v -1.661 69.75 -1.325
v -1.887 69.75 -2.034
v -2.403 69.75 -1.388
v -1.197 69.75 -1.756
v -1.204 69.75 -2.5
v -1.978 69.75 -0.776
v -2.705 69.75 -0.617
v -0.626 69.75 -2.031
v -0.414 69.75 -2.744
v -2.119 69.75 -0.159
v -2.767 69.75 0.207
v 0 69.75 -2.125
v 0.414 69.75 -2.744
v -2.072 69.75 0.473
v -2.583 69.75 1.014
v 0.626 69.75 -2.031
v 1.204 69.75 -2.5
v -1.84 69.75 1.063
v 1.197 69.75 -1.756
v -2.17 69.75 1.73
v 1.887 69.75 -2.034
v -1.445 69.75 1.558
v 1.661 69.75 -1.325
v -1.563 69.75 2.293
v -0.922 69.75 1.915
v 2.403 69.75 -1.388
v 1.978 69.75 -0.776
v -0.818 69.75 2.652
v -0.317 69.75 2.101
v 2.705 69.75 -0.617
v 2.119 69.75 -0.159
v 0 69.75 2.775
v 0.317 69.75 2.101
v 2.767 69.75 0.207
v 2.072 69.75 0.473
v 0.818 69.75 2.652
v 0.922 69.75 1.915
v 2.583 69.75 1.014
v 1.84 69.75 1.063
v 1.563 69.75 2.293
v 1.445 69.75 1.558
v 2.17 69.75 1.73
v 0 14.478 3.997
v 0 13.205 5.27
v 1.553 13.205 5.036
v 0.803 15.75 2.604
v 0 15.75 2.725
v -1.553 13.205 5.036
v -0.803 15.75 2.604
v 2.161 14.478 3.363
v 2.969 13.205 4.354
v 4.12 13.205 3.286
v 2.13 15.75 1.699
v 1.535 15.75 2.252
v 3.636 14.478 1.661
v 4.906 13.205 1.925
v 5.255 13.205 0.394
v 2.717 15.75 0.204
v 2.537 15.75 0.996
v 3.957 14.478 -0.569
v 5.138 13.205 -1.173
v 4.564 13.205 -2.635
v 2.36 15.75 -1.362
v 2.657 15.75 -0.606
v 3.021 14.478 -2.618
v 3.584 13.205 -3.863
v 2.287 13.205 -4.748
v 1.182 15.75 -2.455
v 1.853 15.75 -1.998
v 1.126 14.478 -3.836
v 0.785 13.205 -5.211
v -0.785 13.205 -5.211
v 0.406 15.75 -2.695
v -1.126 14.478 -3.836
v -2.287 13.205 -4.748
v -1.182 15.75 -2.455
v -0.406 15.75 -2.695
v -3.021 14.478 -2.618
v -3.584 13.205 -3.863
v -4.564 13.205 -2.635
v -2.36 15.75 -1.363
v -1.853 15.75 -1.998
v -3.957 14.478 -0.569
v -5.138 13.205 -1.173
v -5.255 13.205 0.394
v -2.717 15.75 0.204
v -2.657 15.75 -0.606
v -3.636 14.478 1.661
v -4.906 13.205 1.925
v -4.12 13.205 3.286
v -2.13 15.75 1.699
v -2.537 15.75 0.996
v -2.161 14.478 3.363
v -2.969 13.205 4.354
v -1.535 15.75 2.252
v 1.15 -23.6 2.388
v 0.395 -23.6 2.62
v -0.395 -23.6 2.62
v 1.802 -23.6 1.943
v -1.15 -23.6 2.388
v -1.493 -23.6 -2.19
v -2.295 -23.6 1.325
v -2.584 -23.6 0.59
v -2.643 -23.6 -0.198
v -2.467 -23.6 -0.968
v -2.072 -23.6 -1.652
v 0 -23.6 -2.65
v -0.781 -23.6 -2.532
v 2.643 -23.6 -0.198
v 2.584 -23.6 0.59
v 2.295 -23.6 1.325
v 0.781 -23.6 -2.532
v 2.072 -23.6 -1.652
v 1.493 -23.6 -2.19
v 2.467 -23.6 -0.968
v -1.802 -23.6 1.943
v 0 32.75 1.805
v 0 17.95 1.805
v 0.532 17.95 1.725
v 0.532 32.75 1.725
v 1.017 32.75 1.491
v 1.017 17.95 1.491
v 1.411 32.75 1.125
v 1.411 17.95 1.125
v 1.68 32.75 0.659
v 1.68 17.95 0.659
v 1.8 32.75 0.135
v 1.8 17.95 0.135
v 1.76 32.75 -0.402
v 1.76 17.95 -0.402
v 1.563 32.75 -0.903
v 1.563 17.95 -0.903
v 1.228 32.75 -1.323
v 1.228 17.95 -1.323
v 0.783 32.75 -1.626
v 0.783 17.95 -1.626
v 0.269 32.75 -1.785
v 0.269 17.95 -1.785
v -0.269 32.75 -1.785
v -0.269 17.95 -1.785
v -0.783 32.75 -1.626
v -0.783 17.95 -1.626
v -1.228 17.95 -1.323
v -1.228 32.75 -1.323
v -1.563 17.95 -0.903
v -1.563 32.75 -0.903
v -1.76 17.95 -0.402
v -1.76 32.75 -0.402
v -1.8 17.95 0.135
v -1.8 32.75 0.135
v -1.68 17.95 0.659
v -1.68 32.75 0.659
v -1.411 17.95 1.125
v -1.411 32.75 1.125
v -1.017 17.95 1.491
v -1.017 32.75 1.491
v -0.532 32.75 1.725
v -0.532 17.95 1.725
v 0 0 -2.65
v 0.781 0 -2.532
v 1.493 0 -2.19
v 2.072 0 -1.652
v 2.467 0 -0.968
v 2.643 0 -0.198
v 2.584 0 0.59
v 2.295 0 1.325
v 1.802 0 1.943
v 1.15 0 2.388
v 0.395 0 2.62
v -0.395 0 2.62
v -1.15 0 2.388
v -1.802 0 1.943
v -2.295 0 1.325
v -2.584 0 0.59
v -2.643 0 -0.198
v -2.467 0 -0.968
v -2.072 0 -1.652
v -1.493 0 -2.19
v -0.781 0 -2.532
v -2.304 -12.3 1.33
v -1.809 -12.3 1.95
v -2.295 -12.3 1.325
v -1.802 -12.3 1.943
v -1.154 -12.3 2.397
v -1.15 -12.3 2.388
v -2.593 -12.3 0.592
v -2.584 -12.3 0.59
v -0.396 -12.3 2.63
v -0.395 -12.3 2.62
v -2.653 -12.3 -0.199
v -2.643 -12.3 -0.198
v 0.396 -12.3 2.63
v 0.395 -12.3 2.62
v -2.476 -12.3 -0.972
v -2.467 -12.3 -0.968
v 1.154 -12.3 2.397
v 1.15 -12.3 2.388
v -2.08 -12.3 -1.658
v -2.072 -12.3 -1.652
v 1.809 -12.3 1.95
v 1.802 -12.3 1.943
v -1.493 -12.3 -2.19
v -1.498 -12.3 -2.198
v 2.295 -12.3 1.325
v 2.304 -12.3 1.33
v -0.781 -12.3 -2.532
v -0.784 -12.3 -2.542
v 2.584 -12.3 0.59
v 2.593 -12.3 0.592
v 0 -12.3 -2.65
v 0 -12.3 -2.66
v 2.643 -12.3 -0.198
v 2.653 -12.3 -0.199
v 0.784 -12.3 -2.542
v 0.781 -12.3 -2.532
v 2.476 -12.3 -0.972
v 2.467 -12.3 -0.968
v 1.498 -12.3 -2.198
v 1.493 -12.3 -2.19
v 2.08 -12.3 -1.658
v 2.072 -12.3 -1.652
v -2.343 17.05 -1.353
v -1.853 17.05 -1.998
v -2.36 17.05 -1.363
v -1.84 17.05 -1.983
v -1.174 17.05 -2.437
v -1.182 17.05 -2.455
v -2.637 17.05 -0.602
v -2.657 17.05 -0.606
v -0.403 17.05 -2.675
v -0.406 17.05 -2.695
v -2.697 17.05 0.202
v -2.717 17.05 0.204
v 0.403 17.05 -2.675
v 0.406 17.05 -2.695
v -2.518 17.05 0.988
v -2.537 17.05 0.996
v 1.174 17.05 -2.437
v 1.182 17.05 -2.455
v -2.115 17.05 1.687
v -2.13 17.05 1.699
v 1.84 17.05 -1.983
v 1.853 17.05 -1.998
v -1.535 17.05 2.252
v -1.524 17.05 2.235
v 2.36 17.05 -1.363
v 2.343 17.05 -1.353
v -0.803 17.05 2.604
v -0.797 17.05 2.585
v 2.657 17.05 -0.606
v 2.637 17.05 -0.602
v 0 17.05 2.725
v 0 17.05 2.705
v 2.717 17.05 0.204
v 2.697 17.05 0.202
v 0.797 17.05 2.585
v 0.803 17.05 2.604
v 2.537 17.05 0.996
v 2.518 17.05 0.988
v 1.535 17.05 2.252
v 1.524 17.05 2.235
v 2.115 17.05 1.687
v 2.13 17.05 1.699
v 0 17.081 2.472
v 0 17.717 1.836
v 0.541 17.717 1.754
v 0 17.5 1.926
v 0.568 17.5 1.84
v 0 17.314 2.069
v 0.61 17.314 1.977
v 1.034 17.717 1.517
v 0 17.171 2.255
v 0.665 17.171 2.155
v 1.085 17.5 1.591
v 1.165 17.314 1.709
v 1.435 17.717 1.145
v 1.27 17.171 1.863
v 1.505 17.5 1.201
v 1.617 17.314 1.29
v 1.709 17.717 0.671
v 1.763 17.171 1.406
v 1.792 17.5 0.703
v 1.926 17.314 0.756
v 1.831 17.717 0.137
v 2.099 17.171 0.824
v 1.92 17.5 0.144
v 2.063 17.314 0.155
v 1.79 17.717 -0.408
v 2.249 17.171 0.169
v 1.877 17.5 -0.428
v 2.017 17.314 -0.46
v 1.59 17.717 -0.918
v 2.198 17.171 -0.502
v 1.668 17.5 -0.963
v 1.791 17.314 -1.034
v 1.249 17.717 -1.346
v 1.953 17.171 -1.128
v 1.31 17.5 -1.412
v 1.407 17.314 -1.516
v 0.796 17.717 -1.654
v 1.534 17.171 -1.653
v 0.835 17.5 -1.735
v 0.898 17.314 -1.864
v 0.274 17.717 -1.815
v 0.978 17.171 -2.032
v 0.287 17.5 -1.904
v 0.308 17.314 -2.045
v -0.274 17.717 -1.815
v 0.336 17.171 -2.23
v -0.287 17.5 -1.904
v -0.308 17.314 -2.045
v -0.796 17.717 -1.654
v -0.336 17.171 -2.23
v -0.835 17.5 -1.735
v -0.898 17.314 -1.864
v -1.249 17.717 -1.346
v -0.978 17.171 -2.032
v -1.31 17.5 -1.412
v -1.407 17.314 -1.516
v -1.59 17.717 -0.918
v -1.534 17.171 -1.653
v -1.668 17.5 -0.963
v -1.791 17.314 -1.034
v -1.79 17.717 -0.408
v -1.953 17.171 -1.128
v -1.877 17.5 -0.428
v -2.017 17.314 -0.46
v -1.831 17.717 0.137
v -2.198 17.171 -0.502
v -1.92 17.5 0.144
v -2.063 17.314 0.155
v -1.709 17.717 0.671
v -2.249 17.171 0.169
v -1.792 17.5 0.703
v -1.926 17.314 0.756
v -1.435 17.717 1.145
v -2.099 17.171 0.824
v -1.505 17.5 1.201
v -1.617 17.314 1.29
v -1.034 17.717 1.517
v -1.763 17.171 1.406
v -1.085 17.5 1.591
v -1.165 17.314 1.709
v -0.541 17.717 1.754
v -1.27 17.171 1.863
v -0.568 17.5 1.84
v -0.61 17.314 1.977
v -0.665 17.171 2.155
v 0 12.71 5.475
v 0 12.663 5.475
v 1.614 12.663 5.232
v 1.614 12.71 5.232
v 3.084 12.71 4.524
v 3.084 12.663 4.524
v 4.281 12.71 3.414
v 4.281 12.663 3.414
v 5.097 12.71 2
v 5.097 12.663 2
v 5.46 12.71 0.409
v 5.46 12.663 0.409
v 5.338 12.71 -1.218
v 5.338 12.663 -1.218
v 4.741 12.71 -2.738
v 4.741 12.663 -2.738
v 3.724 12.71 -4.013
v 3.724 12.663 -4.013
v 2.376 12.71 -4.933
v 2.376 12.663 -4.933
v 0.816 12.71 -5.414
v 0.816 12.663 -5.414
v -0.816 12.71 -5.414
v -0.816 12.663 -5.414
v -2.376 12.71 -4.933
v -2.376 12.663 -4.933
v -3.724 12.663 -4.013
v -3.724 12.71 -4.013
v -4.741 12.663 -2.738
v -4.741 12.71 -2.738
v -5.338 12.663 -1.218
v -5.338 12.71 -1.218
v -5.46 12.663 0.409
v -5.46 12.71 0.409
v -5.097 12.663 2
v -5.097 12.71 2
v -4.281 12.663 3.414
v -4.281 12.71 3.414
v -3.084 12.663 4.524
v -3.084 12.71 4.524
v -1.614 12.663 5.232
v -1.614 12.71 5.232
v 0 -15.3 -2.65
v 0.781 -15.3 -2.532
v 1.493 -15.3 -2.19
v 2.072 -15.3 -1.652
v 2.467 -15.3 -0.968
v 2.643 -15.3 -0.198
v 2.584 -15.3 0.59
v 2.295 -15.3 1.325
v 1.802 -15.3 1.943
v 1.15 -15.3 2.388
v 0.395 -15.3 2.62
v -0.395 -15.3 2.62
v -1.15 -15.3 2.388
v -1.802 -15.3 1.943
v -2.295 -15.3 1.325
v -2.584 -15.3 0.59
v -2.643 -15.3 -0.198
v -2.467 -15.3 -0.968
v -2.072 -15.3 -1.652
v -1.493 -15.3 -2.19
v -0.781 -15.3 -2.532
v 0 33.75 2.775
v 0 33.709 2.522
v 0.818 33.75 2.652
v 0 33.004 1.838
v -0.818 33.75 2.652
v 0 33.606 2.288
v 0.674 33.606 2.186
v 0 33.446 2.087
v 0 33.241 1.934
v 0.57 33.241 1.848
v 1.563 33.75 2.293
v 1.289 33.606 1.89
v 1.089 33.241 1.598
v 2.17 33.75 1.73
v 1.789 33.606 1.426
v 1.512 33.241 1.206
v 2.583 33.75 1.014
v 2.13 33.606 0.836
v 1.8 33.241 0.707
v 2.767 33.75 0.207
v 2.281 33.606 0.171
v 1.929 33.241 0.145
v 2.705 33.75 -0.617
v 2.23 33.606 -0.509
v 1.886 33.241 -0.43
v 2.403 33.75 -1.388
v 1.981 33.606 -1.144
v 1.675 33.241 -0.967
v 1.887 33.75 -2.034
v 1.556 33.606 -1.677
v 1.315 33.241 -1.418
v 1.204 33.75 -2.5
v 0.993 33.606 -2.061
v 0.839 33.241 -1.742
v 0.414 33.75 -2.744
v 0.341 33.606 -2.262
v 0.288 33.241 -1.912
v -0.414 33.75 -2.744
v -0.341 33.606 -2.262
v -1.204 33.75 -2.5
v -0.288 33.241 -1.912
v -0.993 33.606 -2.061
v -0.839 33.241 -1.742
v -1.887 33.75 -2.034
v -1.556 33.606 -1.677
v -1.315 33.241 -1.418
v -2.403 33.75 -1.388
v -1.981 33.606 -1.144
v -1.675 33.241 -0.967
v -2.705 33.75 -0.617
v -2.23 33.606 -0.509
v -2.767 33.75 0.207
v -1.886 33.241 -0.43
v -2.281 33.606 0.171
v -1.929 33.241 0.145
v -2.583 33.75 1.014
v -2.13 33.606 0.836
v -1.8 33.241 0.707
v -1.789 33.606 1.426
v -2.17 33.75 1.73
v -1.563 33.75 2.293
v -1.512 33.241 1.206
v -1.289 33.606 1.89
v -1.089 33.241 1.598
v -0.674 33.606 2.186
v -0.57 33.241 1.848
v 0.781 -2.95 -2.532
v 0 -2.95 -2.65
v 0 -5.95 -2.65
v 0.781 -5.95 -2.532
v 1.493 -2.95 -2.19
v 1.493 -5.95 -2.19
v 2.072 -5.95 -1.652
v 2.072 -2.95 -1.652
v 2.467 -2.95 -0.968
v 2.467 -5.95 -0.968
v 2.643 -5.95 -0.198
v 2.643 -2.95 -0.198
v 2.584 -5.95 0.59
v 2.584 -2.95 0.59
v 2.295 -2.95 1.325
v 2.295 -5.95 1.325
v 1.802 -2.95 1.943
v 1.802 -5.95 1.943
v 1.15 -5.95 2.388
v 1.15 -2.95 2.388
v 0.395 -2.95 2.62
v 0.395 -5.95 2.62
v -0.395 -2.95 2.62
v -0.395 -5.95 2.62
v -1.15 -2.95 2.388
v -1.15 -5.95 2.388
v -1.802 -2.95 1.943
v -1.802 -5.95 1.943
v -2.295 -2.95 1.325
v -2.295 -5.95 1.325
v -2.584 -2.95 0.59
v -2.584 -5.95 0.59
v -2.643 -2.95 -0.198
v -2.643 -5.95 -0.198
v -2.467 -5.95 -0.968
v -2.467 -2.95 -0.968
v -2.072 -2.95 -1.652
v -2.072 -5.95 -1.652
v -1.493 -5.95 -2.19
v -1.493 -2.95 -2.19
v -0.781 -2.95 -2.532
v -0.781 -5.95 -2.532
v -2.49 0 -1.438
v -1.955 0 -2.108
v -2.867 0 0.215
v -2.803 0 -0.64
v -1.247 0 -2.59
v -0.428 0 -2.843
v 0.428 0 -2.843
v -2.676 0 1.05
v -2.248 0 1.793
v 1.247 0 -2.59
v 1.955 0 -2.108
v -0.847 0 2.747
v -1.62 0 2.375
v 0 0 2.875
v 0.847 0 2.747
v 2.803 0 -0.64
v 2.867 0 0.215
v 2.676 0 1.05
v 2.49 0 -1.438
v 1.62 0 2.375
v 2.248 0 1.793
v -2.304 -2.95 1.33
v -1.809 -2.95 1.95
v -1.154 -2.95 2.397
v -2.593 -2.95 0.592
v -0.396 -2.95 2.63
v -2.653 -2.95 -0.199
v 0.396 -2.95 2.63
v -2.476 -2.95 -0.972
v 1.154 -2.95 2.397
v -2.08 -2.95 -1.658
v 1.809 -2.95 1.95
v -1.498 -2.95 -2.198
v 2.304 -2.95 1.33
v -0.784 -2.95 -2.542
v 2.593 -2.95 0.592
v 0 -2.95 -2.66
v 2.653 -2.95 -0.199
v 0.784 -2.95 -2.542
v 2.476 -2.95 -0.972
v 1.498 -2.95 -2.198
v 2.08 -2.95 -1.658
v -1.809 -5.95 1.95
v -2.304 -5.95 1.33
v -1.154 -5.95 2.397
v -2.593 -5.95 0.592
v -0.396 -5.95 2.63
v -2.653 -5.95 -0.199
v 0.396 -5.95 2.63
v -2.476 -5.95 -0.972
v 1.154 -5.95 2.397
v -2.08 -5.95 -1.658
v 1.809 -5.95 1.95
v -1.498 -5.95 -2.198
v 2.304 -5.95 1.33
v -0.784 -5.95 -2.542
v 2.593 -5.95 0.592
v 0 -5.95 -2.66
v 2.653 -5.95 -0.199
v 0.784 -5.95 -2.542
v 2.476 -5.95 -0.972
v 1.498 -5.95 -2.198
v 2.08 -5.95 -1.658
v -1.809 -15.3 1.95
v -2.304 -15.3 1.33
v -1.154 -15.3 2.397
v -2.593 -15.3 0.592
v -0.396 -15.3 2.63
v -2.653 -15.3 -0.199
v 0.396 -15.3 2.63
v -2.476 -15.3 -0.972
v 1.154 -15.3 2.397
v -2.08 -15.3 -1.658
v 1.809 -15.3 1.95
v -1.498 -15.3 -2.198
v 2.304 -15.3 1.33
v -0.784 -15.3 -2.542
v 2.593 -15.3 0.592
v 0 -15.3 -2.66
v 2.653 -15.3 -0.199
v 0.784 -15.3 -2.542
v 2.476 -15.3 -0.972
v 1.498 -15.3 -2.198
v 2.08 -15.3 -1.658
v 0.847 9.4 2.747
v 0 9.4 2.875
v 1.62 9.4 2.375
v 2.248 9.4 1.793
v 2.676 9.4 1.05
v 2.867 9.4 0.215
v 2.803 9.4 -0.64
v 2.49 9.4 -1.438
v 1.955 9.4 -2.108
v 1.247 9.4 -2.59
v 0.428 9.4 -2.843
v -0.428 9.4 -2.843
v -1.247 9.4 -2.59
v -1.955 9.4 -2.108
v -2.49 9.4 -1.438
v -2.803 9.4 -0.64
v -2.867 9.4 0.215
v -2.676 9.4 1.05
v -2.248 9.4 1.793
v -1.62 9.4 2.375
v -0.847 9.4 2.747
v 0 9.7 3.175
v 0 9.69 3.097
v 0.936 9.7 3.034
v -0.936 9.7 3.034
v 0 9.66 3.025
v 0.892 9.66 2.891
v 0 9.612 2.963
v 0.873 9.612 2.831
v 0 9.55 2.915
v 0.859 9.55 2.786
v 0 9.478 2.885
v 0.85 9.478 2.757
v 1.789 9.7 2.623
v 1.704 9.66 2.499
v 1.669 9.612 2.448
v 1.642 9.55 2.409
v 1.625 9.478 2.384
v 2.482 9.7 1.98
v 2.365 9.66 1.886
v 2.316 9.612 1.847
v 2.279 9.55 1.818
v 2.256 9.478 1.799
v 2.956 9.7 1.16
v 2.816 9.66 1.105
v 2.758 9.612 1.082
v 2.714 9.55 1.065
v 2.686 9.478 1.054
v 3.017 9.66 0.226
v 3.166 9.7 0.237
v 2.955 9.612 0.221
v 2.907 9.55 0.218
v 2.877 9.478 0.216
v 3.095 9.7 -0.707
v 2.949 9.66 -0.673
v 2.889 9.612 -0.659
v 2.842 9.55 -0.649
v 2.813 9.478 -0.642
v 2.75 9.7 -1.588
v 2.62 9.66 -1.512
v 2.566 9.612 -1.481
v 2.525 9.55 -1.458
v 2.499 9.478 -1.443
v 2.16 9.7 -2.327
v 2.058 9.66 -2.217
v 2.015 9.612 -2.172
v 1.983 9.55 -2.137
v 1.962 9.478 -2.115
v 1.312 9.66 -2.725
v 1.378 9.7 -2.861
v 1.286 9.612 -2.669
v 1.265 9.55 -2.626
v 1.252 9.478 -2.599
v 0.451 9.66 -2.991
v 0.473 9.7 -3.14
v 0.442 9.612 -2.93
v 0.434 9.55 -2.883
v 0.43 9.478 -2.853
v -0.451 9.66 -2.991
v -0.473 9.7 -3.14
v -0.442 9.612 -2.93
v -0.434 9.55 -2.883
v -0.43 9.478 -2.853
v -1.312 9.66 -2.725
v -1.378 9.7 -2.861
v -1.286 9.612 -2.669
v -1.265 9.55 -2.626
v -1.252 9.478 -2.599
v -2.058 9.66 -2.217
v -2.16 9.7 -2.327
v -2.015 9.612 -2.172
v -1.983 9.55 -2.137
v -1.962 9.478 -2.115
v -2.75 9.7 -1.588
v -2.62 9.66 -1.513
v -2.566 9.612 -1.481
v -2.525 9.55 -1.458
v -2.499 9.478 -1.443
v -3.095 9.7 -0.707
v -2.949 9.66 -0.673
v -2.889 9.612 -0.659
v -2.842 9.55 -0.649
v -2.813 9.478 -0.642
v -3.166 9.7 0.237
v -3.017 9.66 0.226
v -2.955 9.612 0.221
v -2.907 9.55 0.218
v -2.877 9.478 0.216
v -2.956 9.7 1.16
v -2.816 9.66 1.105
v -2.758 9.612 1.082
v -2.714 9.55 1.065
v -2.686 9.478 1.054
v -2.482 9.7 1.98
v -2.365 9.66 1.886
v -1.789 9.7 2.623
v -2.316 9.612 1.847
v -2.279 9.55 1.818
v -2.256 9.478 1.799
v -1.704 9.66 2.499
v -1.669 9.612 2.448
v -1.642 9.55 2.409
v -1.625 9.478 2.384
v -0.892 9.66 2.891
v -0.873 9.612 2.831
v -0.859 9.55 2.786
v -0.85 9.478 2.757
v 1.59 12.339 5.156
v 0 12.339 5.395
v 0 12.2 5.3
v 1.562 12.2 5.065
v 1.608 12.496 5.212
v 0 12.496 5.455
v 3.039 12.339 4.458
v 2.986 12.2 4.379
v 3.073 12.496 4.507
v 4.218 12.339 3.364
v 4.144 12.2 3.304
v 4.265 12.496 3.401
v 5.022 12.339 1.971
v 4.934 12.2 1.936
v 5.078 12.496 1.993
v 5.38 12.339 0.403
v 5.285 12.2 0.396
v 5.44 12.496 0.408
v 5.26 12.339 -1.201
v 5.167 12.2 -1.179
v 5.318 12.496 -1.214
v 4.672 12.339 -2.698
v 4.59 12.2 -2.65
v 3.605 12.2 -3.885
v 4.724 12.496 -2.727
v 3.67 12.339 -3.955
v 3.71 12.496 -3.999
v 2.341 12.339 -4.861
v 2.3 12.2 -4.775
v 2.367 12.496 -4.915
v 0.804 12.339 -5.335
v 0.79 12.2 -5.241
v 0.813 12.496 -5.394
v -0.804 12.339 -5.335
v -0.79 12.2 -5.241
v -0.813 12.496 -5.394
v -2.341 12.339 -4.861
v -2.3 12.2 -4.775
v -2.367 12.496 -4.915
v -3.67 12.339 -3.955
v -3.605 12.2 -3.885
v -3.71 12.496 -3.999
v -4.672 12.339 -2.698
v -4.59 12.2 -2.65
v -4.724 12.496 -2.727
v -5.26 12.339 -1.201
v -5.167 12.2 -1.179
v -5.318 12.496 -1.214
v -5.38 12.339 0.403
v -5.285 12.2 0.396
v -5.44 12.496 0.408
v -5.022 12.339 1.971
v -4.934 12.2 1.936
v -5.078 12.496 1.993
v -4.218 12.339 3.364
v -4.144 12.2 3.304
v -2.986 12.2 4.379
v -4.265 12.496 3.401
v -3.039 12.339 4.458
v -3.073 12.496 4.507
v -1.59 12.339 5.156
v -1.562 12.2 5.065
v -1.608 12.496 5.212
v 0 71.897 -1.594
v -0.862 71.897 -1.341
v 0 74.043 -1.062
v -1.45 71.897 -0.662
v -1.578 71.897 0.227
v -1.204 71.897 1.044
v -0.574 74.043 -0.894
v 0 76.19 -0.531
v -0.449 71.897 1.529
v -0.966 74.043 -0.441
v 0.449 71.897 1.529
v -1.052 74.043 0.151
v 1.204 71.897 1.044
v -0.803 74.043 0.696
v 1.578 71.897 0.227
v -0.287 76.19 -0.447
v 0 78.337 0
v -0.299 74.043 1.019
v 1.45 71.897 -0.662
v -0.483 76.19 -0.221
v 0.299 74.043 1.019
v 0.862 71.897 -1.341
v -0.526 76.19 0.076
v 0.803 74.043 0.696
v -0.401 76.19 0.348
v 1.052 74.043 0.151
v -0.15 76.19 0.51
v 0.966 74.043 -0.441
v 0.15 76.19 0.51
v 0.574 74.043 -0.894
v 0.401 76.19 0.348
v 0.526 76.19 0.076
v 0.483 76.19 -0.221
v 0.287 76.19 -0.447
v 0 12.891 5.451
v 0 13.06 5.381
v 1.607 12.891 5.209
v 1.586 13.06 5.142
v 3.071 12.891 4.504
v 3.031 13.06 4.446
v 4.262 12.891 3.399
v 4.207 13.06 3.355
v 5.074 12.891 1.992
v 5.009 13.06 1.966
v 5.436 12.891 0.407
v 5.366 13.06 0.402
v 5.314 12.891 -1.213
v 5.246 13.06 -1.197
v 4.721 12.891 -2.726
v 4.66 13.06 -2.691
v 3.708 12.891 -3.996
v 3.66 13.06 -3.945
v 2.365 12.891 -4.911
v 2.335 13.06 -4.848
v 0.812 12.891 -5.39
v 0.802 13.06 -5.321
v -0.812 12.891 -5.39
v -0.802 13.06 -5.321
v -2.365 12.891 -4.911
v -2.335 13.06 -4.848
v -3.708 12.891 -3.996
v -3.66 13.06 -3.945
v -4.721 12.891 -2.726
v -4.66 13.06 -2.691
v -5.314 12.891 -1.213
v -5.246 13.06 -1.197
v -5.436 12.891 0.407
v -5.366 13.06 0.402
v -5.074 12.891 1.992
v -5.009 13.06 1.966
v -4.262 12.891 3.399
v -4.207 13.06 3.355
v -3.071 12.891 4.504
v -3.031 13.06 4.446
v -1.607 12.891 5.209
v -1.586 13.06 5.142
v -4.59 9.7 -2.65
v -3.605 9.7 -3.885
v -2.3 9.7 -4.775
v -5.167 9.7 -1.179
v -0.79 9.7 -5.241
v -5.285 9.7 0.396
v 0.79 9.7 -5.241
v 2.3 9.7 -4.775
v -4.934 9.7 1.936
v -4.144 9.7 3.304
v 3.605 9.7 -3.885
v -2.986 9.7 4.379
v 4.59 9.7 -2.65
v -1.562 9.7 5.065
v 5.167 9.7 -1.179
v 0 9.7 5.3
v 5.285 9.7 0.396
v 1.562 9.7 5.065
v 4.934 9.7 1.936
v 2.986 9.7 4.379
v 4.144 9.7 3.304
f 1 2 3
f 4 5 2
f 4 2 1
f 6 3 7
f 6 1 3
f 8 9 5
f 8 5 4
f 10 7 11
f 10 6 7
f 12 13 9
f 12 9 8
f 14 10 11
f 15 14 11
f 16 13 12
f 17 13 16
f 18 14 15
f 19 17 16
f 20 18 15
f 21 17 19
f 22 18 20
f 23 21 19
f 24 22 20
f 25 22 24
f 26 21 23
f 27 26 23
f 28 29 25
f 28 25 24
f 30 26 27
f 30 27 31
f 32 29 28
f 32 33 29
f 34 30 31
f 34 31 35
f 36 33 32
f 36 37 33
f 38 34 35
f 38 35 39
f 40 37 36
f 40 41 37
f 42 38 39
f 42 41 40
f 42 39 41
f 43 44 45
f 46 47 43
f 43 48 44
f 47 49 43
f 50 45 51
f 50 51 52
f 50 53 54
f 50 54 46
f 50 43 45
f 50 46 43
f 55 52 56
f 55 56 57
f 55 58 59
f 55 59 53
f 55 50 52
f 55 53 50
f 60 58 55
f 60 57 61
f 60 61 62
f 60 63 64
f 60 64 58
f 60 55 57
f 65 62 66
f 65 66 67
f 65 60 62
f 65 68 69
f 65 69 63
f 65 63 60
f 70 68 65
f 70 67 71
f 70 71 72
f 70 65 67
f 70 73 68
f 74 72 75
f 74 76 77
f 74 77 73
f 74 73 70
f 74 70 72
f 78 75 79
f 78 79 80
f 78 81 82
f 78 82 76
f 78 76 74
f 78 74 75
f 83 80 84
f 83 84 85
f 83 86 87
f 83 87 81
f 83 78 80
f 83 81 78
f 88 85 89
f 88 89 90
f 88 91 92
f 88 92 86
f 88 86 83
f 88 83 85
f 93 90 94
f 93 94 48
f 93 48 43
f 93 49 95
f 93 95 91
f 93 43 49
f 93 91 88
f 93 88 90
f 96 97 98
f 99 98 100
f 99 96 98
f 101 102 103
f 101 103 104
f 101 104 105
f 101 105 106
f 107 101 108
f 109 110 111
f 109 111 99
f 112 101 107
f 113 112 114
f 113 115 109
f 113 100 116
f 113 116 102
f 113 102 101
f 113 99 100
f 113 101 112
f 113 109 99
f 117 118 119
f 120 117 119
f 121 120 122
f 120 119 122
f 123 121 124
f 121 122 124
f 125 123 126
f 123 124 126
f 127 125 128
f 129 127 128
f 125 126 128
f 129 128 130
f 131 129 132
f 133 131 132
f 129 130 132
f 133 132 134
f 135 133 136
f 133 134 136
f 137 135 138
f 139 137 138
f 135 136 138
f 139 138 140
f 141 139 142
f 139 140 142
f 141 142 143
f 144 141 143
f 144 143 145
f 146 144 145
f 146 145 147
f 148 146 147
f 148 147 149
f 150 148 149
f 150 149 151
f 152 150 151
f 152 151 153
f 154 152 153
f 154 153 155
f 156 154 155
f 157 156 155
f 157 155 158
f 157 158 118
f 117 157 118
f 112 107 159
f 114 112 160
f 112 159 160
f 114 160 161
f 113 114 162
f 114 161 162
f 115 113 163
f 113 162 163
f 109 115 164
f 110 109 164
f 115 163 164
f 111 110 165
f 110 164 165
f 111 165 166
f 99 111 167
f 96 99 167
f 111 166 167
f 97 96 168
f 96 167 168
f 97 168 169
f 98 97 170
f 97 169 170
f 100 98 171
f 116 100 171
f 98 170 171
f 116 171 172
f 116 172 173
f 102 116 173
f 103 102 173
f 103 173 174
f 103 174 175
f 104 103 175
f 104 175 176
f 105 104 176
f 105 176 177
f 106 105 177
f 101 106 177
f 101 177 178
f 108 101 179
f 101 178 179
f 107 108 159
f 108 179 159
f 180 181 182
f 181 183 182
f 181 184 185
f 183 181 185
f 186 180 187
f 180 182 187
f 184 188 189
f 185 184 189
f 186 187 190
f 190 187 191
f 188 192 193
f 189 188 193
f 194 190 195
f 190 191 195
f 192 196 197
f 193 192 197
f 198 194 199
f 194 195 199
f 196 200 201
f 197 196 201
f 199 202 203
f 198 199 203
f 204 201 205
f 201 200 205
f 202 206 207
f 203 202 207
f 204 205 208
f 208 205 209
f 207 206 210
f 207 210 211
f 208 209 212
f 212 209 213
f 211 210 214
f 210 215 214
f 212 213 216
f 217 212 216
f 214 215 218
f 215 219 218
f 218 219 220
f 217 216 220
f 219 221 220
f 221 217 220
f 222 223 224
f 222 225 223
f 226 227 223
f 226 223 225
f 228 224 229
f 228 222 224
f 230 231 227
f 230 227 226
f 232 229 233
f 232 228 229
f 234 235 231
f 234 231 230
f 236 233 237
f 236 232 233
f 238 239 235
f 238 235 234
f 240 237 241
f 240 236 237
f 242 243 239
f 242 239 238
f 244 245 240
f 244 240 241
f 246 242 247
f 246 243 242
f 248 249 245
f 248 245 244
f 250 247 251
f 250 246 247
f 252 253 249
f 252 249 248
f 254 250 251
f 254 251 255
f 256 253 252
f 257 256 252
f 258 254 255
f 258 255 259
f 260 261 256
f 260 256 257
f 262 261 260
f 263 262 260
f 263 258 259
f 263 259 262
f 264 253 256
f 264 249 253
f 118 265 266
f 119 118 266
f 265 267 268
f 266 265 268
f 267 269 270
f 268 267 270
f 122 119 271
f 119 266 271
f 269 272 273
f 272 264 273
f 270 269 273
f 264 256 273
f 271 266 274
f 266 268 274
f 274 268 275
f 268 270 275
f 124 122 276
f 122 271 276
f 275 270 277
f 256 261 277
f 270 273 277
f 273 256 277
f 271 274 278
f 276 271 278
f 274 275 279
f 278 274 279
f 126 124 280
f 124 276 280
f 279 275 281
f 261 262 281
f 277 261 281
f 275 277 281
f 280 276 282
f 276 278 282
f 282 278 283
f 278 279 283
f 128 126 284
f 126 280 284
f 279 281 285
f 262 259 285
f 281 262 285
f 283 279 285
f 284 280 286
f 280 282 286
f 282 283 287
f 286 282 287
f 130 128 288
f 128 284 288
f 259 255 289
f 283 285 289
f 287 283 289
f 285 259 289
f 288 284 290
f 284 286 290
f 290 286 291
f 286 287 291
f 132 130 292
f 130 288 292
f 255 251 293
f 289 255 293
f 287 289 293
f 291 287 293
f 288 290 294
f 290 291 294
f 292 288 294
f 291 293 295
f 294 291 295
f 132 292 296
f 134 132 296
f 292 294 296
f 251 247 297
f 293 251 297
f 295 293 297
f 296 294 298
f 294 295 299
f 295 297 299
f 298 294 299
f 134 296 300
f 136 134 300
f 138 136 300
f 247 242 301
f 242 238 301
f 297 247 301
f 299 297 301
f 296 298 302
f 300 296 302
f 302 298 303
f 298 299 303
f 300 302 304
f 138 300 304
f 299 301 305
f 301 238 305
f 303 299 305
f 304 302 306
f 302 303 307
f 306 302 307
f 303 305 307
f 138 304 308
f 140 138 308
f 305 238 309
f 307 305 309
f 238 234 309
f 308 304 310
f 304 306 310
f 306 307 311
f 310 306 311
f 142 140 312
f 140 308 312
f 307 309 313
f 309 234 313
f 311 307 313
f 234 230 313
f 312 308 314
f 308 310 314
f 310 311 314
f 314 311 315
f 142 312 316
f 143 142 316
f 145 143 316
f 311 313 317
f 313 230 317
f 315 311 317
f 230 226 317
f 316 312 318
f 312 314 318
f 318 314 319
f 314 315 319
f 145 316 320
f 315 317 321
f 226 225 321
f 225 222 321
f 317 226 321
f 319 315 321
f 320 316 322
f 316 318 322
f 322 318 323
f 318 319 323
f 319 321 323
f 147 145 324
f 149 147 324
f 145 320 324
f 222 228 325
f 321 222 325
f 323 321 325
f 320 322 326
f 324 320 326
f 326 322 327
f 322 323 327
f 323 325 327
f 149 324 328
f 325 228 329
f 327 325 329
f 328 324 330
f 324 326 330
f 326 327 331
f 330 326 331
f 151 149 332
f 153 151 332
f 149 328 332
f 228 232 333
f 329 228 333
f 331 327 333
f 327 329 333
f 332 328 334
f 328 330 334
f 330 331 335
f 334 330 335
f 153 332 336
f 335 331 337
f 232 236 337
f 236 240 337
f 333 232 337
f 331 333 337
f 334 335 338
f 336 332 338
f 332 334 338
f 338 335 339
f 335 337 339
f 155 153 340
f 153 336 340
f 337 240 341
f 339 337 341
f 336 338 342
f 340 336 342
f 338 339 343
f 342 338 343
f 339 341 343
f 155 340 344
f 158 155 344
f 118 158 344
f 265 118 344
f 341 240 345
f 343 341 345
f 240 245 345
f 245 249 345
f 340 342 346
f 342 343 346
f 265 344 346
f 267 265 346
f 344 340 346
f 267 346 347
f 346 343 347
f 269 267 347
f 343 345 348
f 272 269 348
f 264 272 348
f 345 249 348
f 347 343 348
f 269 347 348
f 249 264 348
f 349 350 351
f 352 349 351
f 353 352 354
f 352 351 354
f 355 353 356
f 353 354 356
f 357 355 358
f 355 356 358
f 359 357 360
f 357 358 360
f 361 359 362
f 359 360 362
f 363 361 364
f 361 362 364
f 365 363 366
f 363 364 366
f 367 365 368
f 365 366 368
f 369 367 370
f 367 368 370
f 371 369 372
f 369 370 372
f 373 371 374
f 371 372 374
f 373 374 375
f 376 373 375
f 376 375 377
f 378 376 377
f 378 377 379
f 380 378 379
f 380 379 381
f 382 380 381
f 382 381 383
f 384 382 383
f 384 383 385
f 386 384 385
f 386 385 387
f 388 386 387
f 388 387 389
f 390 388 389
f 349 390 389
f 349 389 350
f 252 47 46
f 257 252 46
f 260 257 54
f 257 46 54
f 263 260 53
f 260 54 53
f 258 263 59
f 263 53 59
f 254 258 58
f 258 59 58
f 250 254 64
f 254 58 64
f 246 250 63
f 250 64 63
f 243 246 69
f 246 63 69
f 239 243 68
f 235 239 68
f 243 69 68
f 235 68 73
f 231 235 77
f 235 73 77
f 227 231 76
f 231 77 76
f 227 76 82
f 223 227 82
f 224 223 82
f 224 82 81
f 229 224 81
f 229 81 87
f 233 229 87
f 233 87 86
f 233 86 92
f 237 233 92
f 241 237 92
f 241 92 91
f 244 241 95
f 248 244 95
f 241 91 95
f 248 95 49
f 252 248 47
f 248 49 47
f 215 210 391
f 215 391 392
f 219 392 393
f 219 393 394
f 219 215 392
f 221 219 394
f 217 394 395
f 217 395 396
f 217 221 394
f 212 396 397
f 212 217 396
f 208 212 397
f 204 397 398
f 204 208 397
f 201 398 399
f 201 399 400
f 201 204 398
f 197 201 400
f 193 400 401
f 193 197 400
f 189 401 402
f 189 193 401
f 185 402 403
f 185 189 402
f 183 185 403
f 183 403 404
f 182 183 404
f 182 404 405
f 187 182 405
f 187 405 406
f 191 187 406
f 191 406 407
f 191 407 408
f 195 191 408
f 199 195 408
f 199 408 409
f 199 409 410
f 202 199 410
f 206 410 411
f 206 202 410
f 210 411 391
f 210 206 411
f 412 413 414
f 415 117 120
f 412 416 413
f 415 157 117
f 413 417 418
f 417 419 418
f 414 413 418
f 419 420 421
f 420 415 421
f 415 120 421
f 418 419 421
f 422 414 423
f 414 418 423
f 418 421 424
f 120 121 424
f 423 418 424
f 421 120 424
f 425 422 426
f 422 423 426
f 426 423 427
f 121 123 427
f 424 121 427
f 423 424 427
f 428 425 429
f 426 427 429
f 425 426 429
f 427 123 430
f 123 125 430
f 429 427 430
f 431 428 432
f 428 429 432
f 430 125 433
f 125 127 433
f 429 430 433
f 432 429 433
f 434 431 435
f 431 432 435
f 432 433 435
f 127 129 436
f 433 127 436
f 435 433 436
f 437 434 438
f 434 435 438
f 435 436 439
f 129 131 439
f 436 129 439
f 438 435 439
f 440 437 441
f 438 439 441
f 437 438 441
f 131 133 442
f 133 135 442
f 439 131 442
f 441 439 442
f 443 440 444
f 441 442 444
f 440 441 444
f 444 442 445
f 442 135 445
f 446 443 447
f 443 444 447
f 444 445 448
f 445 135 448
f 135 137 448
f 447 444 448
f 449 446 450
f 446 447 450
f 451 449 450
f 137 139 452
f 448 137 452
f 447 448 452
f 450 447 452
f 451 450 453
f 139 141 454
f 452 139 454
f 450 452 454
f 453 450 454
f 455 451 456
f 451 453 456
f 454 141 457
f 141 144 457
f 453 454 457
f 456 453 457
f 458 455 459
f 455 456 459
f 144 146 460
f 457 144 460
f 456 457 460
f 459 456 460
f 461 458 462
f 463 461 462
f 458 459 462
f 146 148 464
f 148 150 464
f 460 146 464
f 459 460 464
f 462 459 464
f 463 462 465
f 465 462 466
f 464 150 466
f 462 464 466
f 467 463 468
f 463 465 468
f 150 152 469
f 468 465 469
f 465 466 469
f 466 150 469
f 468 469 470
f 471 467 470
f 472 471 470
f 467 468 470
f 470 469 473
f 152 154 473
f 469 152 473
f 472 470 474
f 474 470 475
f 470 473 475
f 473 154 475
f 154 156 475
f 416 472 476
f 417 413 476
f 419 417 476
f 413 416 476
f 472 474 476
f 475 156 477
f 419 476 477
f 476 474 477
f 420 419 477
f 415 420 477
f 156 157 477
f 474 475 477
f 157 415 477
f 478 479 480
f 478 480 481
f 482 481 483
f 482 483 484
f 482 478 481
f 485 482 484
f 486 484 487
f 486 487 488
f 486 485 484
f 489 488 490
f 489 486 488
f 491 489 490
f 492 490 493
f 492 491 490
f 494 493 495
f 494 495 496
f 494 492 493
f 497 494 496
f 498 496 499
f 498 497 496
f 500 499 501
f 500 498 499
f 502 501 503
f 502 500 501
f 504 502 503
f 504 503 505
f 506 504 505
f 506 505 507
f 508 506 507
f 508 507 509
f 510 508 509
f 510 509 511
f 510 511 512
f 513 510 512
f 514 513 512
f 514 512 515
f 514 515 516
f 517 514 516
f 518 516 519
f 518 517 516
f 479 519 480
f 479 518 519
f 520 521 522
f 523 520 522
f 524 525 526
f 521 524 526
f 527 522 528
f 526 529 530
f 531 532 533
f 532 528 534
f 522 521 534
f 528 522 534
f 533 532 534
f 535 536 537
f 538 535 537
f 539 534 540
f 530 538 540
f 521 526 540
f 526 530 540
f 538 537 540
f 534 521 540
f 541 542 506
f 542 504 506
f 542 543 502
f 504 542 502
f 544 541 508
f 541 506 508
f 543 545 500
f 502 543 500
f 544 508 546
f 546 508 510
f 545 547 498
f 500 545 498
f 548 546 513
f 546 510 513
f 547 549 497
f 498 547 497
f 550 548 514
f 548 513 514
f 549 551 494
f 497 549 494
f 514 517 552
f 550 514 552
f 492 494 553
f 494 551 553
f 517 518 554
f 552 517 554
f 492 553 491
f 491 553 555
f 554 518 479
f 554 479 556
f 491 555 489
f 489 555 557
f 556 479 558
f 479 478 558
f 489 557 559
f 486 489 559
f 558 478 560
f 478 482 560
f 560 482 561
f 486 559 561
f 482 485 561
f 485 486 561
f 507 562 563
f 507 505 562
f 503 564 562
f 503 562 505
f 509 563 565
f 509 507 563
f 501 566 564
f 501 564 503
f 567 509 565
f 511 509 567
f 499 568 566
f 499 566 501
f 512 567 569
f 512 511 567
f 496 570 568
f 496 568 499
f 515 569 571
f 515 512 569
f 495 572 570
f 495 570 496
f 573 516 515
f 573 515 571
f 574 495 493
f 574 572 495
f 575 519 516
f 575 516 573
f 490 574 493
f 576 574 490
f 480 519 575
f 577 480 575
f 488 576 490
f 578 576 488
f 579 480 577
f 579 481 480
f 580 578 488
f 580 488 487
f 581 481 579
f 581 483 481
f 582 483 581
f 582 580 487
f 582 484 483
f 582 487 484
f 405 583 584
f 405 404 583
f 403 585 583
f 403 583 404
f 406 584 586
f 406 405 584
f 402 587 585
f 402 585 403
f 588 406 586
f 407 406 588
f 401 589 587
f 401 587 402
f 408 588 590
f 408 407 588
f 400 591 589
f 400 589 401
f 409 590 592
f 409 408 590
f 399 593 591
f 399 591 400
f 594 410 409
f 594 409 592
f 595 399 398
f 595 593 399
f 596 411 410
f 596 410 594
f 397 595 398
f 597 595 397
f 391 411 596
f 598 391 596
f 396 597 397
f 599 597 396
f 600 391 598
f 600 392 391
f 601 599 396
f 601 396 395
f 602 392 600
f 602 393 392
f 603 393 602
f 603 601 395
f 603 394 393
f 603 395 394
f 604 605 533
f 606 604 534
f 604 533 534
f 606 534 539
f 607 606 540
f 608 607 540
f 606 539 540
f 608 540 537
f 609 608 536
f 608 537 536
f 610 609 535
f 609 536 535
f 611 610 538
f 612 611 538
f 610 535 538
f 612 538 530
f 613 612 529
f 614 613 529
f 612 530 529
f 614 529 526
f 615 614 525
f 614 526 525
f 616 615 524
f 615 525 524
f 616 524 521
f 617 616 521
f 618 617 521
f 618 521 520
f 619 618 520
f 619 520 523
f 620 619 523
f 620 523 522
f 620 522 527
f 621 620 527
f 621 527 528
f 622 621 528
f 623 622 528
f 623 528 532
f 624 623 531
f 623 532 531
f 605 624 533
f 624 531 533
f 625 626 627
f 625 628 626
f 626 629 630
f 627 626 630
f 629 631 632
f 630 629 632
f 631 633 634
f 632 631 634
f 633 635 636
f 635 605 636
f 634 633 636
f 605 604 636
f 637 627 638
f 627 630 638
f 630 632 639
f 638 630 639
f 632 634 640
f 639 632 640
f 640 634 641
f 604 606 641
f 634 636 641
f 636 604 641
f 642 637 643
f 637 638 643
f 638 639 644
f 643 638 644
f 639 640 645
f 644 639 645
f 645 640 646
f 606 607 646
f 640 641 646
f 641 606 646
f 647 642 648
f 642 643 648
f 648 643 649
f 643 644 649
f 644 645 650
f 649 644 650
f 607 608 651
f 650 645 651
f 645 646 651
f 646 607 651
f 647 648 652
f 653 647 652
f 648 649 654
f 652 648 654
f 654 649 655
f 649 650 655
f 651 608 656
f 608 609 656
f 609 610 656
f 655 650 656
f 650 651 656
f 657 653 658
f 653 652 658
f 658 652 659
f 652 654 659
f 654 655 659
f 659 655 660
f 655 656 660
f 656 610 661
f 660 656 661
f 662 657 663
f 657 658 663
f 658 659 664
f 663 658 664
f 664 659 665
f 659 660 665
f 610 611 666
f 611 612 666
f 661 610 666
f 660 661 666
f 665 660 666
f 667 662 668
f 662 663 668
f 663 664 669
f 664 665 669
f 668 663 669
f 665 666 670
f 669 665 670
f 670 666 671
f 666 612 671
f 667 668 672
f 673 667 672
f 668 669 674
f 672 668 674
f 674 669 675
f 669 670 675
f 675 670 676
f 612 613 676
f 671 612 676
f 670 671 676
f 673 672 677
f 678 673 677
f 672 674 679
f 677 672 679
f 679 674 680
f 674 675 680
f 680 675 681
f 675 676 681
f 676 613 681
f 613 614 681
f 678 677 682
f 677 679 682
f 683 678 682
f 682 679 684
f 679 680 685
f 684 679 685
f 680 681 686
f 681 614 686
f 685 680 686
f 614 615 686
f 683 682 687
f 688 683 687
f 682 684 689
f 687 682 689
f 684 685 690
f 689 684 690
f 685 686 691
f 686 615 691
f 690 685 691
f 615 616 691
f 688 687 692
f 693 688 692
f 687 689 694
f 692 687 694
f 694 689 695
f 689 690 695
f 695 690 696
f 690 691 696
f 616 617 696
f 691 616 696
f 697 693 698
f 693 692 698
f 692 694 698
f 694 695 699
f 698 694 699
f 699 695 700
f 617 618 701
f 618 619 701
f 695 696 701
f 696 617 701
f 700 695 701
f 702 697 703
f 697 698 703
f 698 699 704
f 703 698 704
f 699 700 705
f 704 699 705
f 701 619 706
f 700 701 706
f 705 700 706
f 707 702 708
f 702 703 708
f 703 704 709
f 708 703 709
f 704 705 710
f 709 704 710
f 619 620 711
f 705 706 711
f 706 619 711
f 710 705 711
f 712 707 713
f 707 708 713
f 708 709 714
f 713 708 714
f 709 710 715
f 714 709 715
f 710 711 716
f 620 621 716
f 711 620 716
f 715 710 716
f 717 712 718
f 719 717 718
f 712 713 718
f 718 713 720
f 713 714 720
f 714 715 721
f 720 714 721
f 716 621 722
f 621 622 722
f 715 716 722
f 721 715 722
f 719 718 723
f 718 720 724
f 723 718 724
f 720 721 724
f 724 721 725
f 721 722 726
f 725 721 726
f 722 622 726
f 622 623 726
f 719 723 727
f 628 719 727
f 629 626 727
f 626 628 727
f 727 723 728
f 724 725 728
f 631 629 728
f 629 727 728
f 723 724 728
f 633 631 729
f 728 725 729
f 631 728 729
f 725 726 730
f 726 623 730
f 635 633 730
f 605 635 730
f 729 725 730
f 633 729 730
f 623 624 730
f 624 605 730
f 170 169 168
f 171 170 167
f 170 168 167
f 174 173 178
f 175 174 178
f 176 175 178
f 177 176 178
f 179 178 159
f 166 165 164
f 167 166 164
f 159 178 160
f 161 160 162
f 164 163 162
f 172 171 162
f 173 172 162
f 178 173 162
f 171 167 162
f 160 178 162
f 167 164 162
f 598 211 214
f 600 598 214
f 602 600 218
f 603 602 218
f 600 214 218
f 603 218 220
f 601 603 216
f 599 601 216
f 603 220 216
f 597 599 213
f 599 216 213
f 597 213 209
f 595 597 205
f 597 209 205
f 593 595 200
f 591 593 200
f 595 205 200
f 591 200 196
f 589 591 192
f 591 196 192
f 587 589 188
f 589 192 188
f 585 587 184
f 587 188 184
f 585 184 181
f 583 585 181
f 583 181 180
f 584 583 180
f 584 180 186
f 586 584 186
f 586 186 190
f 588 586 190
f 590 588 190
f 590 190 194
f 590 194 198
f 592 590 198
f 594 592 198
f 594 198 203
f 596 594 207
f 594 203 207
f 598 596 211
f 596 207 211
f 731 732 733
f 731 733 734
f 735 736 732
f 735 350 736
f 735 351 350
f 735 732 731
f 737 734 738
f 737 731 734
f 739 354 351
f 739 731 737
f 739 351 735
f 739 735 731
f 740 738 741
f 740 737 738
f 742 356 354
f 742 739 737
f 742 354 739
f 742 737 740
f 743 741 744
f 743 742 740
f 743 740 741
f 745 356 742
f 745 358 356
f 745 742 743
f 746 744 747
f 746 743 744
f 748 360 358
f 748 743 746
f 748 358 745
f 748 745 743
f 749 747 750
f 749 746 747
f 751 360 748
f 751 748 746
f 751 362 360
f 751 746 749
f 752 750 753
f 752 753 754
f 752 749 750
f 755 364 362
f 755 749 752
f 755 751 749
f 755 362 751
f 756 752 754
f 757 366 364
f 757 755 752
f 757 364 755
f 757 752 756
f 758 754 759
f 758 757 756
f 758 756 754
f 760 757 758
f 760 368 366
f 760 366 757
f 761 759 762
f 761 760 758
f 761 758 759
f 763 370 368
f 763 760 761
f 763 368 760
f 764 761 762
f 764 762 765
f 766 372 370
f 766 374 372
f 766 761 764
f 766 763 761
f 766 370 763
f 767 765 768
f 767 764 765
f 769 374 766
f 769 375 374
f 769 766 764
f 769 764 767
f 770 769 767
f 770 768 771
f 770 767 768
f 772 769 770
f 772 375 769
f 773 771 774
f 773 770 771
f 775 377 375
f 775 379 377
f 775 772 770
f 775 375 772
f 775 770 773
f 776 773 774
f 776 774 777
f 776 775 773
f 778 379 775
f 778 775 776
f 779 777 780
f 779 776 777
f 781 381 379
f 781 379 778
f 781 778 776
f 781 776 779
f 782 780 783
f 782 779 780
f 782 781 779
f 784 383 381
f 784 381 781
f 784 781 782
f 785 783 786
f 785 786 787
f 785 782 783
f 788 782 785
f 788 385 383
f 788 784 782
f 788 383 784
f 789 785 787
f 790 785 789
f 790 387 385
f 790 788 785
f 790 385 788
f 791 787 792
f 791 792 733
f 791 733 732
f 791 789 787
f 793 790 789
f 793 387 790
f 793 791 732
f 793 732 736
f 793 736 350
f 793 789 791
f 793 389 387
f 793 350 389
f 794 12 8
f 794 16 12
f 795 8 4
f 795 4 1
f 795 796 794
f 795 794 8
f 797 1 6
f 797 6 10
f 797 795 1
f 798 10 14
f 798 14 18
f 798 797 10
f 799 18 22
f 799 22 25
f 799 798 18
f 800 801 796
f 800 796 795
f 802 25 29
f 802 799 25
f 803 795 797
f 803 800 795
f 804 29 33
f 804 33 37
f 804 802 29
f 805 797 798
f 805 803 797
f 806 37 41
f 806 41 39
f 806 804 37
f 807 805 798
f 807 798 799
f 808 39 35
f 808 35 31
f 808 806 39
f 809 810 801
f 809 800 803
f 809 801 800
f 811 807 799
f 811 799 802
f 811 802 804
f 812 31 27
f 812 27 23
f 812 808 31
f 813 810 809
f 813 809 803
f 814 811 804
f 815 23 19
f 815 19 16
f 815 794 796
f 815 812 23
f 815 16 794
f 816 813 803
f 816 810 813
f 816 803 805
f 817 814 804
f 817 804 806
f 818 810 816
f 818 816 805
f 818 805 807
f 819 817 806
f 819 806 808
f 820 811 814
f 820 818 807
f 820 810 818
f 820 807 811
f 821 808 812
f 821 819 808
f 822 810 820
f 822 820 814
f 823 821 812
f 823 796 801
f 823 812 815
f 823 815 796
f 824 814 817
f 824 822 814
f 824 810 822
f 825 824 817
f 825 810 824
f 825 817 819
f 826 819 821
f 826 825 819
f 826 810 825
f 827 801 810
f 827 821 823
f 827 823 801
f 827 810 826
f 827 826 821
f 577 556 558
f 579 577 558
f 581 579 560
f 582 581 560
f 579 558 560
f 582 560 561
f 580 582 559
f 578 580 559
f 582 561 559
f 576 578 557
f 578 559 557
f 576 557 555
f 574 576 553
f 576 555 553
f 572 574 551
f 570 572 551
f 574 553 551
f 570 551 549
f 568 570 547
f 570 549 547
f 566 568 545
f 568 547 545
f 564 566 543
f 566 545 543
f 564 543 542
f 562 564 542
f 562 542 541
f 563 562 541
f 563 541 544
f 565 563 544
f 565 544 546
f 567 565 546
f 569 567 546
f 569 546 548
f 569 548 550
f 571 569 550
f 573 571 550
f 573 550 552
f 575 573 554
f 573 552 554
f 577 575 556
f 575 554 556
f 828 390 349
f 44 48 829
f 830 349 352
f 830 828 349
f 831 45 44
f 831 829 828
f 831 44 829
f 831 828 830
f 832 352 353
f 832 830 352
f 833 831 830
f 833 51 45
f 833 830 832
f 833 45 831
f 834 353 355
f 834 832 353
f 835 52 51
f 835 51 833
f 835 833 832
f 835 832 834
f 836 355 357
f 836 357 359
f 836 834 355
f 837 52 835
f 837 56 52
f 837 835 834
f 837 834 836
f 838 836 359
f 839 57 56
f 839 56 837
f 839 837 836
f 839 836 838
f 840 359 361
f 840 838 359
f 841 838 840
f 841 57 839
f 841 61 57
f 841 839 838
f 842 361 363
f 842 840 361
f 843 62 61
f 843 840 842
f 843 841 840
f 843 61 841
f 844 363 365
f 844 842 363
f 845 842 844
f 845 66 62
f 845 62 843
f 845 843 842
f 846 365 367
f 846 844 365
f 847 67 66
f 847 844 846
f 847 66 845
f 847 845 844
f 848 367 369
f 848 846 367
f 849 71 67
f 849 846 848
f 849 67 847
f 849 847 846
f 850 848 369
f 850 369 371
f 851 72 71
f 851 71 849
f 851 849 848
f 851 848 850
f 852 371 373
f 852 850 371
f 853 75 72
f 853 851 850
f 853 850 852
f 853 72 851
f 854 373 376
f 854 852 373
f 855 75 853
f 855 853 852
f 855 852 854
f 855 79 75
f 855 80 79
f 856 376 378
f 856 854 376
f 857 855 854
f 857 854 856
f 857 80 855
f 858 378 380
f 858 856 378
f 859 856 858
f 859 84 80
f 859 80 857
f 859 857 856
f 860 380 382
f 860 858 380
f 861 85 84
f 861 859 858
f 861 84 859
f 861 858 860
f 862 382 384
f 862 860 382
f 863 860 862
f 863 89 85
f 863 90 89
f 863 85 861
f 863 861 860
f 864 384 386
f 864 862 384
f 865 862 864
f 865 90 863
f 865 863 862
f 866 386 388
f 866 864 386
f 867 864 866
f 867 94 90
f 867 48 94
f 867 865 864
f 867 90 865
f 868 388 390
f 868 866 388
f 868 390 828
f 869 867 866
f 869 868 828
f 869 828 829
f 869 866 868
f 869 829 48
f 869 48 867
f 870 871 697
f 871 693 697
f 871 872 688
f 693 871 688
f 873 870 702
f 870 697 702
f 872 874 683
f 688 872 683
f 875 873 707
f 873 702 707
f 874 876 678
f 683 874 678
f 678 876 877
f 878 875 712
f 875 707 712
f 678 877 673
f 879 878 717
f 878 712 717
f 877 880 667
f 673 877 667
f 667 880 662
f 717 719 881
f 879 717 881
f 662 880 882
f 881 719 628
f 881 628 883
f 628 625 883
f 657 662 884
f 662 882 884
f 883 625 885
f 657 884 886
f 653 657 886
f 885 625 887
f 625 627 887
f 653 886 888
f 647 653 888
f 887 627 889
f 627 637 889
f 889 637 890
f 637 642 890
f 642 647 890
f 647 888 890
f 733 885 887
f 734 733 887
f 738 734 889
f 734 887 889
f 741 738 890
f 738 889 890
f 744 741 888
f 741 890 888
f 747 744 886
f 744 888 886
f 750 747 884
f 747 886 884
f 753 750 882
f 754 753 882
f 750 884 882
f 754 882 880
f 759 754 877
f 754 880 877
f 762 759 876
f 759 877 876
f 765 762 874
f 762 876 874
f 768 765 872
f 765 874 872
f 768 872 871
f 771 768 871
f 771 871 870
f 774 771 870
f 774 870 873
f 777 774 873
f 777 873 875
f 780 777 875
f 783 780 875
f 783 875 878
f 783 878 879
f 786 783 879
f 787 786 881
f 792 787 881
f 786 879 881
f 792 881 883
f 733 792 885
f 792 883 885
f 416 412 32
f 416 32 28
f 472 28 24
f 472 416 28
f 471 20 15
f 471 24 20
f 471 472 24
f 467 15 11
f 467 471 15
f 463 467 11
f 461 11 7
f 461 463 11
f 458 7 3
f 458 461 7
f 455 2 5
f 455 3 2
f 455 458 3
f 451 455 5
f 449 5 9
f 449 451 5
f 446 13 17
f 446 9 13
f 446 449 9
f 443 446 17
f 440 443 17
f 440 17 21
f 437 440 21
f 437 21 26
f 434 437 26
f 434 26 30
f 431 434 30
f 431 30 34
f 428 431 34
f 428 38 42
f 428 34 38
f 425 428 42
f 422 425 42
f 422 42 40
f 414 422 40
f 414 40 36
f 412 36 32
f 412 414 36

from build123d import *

# Parameters (mm, degrees)
SKETCH1_R            = 2.875
BOSS_EXTRUDE1_DEPTH  = 9.7
SKETCH2_R            = 5.3
BOSS_EXTRUDE2_DEPTH  = 2.5
SKETCH3_R            = 5.475
BOSS_EXTRUDE3_DEPTH  = 0.8
SKETCH4_R            = 5.475
BOSS_EXTRUDE4_DEPTH  = 2.75
BOSS_EXTRUDE4_TAPER  = 45
SKETCH5_R            = 2.725
BOSS_EXTRUDE5_DEPTH  = 1.3
SKETCH6_R            = 1.805
BOSS_EXTRUDE6_DEPTH  = 16.7
SKETCH7_R            = 2.775
BOSS_EXTRUDE7_DEPTH  = 36
SKETCH9_R            = 2.65
BOSS_EXTRUDE9_DEPTH  = 23.6
SKETCH10_R           = 2.66
SKETCH10_R_2         = 2.65
BOSS_EXTRUDE10_DEPTH = 3
SKETCH12_R           = 2.66
SKETCH12_R_2         = 2.65
BOSS_EXTRUDE11_DEPTH = 3
FILLET1_R            = 0.7
FILLET2_R            = 0.9
FILLET3_R            = 1
FILLET4_R            = 0.3


with BuildPart() as part:
    # Sketch1 → Boss-Extrude1 (new body)
    with BuildSketch(Plane(origin=(0, 0, 0), x_dir=(1, 0, 0), z_dir=(0, 1, 0))):
        with Locations(Location((0, 0, 0), (0, 0, 270))):
            Circle(SKETCH1_R)
    extrude(amount=BOSS_EXTRUDE1_DEPTH)

    # Sketch2 → Boss-Extrude2 (add)
    with BuildSketch(Plane(origin=(0, 9.7, 0), x_dir=(1, 0, 0), z_dir=(0, 1, 0))):
        with Locations(Location((0, 0, 0), (0, 0, 270))):
            Circle(SKETCH2_R)
    extrude(amount=BOSS_EXTRUDE2_DEPTH)

    # Sketch3 → Boss-Extrude3 (add)
    with BuildSketch(Plane(origin=(0, 12.2, 0), x_dir=(1, 0, 0), z_dir=(0, 1, 0))):
        with Locations(Location((0, 0, 0), (0, 0, 270))):
            Circle(SKETCH3_R)
    extrude(amount=BOSS_EXTRUDE3_DEPTH)

    # Sketch4 → Boss-Extrude4 (add)
    with BuildSketch(Plane(origin=(0, 13, 0), x_dir=(1, 0, 0), z_dir=(0, 1, 0))):
        with Locations(Location((0, 0, 0), (0, 0, 270))):
            Circle(SKETCH4_R)
    extrude(amount=BOSS_EXTRUDE4_DEPTH, taper=BOSS_EXTRUDE4_TAPER)

    # Sketch5 → Boss-Extrude5 (add)
    with BuildSketch(Plane(origin=(0, 15.75, 0), x_dir=(1, 0, 0), z_dir=(0, 1, 0))):
        with Locations(Location((0, 0, 0), (0, 0, 270))):
            Circle(SKETCH5_R)
    extrude(amount=BOSS_EXTRUDE5_DEPTH)

    # Sketch6 → Boss-Extrude6 (add)
    with BuildSketch(Plane(origin=(0, 17.05, 0), x_dir=(1, 0, 0), z_dir=(0, 1, 0))):
        with Locations(Location((0, 0, 0), (0, 0, 270))):
            Circle(SKETCH6_R)
    extrude(amount=BOSS_EXTRUDE6_DEPTH)

    # Sketch7 → Boss-Extrude7 (add)
    with BuildSketch(Plane(origin=(0, 33.75, 0), x_dir=(1, 0, 0), z_dir=(0, 1, 0))):
        with Locations(Location((0, 0, 0), (0, 0, 270))):
            Circle(SKETCH7_R)
    extrude(amount=BOSS_EXTRUDE7_DEPTH)

    # Boss-Extrude8 cone 1 section (through the dimple's axis) → Boss-Extrude8 (revolve)
    with BuildSketch(Plane(origin=(0, 69.75, 0), x_dir=(0, 0, -1), z_dir=(1, 0, 0))):
        Polygon((0, 0), (2.125, 0), (0, 8.586726604), align=None)
    revolve(axis=Axis((0, 69.75, 0), (0, 1, 0)))

    # Fillet1
    # the kernel refuses this fillet: 0.7 mm, written as the material it takes off along each edge
    with BuildSketch(Plane(origin=(0, 12.2, 0), x_dir=(0, 0, 1), z_dir=(-1, 0, 0))) as fillet1_piece_1:
        with BuildLine():
            CenterArc((4.775, 0.463006479), FILLET1_R, 318.590377891, 41.409622109)
            Line((5.3, 0), (5.3105, -0.00926013))
            ThreePointArc((5.3105, -0.00926013), (5.3875, -0.014), (5.475, -0.014))
            Line((5.475, -0.014), (5.489, 0))
            Line((5.489, 0), (5.489, 0.463006479))
            Line((5.489, 0.463006479), (5.475, 0.463006479))
        make_face()
    revolve(axis=Axis((0, 12.2, 0), (0, 1, 0)), mode=Mode.SUBTRACT)
    with BuildSketch(Plane(origin=(0, 13, 0), x_dir=(0, 0, 1), z_dir=(-1, 0, 0))) as fillet1_piece_2:
        with BuildLine():
            CenterArc((5.475 - FILLET1_R, -FILLET1_R * 0.414213562373), FILLET1_R, 0, 45)
            Line((5.475, -FILLET1_R * 0.414213562373), (5.475 + FILLET1_R * 0.02, -FILLET1_R * 0.414213562373))
            Line((5.475 + FILLET1_R * 0.02, -FILLET1_R * 0.414213562373), (5.475 + FILLET1_R * 0.02, FILLET1_R * 0.00828427124746))
            Line((5.475 + FILLET1_R * 0.02, FILLET1_R * 0.00828427124746), (5.475 - FILLET1_R * 0.27875108319, FILLET1_R * 0.307035354437))
            Line((5.475 - FILLET1_R * 0.27875108319, FILLET1_R * 0.307035354437), (5.475 - FILLET1_R * 0.292893218813, FILLET1_R * 0.292893218813))
        make_face()
    revolve(axis=Axis((0, 13, 0), (0, 1, 0)), mode=Mode.SUBTRACT)

    # Fillet2
    fillet2_edges = [part.edges().sort_by_distance(p)[0] for p in [
        (0, 17.05, -1.805),
    ]]
    fillet(fillet2_edges, radius=FILLET2_R)

    # Fillet3
    # the kernel refuses this fillet: 1 mm, written as the material it adds along each edge
    with BuildSketch(Plane(origin=(0, 33.75, 0), x_dir=(0, 0, 1), z_dir=(-1, 0, 0))) as fillet3_piece_1_section:
        with BuildLine():
            CenterArc((1.805 + FILLET3_R, -FILLET3_R), FILLET3_R, 90, 90)
            Line((1.805 + FILLET3_R, 0), (1.805, 0))
            Line((1.805, 0), (1.805, -FILLET3_R))
        make_face()
    fillet3_piece_1 = revolve(axis=Axis((0, 33.75, 0), (0, 1, 0)), mode=Mode.PRIVATE)
    fillet3_piece_1 = fillet3_piece_1 & Plane(origin=(0, 33.456728923, 0), x_dir=(0, 0, 1), z_dir=(0, -1, 0)) * Cylinder(2.775, 12, mode=Mode.PRIVATE)
    add(fillet3_piece_1)

    # Fillet4
    fillet4_edges = [part.edges().sort_by_distance(p)[0] for p in [
        (0, 9.7, -2.875),
    ]]
    fillet(fillet4_edges, radius=FILLET4_R)


with BuildPart() as body_2:
    # Sketch9 → Boss-Extrude9 (new body)
    with BuildSketch(Plane.XZ):
        with Locations(Location((0, 0, 0), (0, 0, 270))):
            Circle(SKETCH9_R)
    extrude(amount=BOSS_EXTRUDE9_DEPTH)


with BuildPart() as body_3:
    # Sketch10 → Boss-Extrude10 (new body)
    with BuildSketch(Plane(origin=(0, -2.95, 0), x_dir=(-1, 0, 0), z_dir=(0, -1, 0))):
        with Locations(Location((0, 0, 0), (0, 0, 90))):
            Circle(SKETCH10_R)
        with Locations(Location((0, 0, 0), (0, 0, 90))):
            Circle(SKETCH10_R_2, mode=Mode.SUBTRACT)
    extrude(amount=BOSS_EXTRUDE10_DEPTH)


with BuildPart() as body_4:
    # Sketch12 → Boss-Extrude11 (new body)
    with BuildSketch(Plane(origin=(0, -12.3, 0), x_dir=(-1, 0, 0), z_dir=(0, -1, 0))):
        with Locations(Location((0, 0, 0), (0, 0, 90))):
            Circle(SKETCH12_R)
        with Locations(Location((0, 0, 0), (0, 0, 90))):
            Circle(SKETCH12_R_2, mode=Mode.SUBTRACT)
    extrude(amount=BOSS_EXTRUDE11_DEPTH)


solid = Compound([part.part, body_2.part, body_3.part, body_4.part])
